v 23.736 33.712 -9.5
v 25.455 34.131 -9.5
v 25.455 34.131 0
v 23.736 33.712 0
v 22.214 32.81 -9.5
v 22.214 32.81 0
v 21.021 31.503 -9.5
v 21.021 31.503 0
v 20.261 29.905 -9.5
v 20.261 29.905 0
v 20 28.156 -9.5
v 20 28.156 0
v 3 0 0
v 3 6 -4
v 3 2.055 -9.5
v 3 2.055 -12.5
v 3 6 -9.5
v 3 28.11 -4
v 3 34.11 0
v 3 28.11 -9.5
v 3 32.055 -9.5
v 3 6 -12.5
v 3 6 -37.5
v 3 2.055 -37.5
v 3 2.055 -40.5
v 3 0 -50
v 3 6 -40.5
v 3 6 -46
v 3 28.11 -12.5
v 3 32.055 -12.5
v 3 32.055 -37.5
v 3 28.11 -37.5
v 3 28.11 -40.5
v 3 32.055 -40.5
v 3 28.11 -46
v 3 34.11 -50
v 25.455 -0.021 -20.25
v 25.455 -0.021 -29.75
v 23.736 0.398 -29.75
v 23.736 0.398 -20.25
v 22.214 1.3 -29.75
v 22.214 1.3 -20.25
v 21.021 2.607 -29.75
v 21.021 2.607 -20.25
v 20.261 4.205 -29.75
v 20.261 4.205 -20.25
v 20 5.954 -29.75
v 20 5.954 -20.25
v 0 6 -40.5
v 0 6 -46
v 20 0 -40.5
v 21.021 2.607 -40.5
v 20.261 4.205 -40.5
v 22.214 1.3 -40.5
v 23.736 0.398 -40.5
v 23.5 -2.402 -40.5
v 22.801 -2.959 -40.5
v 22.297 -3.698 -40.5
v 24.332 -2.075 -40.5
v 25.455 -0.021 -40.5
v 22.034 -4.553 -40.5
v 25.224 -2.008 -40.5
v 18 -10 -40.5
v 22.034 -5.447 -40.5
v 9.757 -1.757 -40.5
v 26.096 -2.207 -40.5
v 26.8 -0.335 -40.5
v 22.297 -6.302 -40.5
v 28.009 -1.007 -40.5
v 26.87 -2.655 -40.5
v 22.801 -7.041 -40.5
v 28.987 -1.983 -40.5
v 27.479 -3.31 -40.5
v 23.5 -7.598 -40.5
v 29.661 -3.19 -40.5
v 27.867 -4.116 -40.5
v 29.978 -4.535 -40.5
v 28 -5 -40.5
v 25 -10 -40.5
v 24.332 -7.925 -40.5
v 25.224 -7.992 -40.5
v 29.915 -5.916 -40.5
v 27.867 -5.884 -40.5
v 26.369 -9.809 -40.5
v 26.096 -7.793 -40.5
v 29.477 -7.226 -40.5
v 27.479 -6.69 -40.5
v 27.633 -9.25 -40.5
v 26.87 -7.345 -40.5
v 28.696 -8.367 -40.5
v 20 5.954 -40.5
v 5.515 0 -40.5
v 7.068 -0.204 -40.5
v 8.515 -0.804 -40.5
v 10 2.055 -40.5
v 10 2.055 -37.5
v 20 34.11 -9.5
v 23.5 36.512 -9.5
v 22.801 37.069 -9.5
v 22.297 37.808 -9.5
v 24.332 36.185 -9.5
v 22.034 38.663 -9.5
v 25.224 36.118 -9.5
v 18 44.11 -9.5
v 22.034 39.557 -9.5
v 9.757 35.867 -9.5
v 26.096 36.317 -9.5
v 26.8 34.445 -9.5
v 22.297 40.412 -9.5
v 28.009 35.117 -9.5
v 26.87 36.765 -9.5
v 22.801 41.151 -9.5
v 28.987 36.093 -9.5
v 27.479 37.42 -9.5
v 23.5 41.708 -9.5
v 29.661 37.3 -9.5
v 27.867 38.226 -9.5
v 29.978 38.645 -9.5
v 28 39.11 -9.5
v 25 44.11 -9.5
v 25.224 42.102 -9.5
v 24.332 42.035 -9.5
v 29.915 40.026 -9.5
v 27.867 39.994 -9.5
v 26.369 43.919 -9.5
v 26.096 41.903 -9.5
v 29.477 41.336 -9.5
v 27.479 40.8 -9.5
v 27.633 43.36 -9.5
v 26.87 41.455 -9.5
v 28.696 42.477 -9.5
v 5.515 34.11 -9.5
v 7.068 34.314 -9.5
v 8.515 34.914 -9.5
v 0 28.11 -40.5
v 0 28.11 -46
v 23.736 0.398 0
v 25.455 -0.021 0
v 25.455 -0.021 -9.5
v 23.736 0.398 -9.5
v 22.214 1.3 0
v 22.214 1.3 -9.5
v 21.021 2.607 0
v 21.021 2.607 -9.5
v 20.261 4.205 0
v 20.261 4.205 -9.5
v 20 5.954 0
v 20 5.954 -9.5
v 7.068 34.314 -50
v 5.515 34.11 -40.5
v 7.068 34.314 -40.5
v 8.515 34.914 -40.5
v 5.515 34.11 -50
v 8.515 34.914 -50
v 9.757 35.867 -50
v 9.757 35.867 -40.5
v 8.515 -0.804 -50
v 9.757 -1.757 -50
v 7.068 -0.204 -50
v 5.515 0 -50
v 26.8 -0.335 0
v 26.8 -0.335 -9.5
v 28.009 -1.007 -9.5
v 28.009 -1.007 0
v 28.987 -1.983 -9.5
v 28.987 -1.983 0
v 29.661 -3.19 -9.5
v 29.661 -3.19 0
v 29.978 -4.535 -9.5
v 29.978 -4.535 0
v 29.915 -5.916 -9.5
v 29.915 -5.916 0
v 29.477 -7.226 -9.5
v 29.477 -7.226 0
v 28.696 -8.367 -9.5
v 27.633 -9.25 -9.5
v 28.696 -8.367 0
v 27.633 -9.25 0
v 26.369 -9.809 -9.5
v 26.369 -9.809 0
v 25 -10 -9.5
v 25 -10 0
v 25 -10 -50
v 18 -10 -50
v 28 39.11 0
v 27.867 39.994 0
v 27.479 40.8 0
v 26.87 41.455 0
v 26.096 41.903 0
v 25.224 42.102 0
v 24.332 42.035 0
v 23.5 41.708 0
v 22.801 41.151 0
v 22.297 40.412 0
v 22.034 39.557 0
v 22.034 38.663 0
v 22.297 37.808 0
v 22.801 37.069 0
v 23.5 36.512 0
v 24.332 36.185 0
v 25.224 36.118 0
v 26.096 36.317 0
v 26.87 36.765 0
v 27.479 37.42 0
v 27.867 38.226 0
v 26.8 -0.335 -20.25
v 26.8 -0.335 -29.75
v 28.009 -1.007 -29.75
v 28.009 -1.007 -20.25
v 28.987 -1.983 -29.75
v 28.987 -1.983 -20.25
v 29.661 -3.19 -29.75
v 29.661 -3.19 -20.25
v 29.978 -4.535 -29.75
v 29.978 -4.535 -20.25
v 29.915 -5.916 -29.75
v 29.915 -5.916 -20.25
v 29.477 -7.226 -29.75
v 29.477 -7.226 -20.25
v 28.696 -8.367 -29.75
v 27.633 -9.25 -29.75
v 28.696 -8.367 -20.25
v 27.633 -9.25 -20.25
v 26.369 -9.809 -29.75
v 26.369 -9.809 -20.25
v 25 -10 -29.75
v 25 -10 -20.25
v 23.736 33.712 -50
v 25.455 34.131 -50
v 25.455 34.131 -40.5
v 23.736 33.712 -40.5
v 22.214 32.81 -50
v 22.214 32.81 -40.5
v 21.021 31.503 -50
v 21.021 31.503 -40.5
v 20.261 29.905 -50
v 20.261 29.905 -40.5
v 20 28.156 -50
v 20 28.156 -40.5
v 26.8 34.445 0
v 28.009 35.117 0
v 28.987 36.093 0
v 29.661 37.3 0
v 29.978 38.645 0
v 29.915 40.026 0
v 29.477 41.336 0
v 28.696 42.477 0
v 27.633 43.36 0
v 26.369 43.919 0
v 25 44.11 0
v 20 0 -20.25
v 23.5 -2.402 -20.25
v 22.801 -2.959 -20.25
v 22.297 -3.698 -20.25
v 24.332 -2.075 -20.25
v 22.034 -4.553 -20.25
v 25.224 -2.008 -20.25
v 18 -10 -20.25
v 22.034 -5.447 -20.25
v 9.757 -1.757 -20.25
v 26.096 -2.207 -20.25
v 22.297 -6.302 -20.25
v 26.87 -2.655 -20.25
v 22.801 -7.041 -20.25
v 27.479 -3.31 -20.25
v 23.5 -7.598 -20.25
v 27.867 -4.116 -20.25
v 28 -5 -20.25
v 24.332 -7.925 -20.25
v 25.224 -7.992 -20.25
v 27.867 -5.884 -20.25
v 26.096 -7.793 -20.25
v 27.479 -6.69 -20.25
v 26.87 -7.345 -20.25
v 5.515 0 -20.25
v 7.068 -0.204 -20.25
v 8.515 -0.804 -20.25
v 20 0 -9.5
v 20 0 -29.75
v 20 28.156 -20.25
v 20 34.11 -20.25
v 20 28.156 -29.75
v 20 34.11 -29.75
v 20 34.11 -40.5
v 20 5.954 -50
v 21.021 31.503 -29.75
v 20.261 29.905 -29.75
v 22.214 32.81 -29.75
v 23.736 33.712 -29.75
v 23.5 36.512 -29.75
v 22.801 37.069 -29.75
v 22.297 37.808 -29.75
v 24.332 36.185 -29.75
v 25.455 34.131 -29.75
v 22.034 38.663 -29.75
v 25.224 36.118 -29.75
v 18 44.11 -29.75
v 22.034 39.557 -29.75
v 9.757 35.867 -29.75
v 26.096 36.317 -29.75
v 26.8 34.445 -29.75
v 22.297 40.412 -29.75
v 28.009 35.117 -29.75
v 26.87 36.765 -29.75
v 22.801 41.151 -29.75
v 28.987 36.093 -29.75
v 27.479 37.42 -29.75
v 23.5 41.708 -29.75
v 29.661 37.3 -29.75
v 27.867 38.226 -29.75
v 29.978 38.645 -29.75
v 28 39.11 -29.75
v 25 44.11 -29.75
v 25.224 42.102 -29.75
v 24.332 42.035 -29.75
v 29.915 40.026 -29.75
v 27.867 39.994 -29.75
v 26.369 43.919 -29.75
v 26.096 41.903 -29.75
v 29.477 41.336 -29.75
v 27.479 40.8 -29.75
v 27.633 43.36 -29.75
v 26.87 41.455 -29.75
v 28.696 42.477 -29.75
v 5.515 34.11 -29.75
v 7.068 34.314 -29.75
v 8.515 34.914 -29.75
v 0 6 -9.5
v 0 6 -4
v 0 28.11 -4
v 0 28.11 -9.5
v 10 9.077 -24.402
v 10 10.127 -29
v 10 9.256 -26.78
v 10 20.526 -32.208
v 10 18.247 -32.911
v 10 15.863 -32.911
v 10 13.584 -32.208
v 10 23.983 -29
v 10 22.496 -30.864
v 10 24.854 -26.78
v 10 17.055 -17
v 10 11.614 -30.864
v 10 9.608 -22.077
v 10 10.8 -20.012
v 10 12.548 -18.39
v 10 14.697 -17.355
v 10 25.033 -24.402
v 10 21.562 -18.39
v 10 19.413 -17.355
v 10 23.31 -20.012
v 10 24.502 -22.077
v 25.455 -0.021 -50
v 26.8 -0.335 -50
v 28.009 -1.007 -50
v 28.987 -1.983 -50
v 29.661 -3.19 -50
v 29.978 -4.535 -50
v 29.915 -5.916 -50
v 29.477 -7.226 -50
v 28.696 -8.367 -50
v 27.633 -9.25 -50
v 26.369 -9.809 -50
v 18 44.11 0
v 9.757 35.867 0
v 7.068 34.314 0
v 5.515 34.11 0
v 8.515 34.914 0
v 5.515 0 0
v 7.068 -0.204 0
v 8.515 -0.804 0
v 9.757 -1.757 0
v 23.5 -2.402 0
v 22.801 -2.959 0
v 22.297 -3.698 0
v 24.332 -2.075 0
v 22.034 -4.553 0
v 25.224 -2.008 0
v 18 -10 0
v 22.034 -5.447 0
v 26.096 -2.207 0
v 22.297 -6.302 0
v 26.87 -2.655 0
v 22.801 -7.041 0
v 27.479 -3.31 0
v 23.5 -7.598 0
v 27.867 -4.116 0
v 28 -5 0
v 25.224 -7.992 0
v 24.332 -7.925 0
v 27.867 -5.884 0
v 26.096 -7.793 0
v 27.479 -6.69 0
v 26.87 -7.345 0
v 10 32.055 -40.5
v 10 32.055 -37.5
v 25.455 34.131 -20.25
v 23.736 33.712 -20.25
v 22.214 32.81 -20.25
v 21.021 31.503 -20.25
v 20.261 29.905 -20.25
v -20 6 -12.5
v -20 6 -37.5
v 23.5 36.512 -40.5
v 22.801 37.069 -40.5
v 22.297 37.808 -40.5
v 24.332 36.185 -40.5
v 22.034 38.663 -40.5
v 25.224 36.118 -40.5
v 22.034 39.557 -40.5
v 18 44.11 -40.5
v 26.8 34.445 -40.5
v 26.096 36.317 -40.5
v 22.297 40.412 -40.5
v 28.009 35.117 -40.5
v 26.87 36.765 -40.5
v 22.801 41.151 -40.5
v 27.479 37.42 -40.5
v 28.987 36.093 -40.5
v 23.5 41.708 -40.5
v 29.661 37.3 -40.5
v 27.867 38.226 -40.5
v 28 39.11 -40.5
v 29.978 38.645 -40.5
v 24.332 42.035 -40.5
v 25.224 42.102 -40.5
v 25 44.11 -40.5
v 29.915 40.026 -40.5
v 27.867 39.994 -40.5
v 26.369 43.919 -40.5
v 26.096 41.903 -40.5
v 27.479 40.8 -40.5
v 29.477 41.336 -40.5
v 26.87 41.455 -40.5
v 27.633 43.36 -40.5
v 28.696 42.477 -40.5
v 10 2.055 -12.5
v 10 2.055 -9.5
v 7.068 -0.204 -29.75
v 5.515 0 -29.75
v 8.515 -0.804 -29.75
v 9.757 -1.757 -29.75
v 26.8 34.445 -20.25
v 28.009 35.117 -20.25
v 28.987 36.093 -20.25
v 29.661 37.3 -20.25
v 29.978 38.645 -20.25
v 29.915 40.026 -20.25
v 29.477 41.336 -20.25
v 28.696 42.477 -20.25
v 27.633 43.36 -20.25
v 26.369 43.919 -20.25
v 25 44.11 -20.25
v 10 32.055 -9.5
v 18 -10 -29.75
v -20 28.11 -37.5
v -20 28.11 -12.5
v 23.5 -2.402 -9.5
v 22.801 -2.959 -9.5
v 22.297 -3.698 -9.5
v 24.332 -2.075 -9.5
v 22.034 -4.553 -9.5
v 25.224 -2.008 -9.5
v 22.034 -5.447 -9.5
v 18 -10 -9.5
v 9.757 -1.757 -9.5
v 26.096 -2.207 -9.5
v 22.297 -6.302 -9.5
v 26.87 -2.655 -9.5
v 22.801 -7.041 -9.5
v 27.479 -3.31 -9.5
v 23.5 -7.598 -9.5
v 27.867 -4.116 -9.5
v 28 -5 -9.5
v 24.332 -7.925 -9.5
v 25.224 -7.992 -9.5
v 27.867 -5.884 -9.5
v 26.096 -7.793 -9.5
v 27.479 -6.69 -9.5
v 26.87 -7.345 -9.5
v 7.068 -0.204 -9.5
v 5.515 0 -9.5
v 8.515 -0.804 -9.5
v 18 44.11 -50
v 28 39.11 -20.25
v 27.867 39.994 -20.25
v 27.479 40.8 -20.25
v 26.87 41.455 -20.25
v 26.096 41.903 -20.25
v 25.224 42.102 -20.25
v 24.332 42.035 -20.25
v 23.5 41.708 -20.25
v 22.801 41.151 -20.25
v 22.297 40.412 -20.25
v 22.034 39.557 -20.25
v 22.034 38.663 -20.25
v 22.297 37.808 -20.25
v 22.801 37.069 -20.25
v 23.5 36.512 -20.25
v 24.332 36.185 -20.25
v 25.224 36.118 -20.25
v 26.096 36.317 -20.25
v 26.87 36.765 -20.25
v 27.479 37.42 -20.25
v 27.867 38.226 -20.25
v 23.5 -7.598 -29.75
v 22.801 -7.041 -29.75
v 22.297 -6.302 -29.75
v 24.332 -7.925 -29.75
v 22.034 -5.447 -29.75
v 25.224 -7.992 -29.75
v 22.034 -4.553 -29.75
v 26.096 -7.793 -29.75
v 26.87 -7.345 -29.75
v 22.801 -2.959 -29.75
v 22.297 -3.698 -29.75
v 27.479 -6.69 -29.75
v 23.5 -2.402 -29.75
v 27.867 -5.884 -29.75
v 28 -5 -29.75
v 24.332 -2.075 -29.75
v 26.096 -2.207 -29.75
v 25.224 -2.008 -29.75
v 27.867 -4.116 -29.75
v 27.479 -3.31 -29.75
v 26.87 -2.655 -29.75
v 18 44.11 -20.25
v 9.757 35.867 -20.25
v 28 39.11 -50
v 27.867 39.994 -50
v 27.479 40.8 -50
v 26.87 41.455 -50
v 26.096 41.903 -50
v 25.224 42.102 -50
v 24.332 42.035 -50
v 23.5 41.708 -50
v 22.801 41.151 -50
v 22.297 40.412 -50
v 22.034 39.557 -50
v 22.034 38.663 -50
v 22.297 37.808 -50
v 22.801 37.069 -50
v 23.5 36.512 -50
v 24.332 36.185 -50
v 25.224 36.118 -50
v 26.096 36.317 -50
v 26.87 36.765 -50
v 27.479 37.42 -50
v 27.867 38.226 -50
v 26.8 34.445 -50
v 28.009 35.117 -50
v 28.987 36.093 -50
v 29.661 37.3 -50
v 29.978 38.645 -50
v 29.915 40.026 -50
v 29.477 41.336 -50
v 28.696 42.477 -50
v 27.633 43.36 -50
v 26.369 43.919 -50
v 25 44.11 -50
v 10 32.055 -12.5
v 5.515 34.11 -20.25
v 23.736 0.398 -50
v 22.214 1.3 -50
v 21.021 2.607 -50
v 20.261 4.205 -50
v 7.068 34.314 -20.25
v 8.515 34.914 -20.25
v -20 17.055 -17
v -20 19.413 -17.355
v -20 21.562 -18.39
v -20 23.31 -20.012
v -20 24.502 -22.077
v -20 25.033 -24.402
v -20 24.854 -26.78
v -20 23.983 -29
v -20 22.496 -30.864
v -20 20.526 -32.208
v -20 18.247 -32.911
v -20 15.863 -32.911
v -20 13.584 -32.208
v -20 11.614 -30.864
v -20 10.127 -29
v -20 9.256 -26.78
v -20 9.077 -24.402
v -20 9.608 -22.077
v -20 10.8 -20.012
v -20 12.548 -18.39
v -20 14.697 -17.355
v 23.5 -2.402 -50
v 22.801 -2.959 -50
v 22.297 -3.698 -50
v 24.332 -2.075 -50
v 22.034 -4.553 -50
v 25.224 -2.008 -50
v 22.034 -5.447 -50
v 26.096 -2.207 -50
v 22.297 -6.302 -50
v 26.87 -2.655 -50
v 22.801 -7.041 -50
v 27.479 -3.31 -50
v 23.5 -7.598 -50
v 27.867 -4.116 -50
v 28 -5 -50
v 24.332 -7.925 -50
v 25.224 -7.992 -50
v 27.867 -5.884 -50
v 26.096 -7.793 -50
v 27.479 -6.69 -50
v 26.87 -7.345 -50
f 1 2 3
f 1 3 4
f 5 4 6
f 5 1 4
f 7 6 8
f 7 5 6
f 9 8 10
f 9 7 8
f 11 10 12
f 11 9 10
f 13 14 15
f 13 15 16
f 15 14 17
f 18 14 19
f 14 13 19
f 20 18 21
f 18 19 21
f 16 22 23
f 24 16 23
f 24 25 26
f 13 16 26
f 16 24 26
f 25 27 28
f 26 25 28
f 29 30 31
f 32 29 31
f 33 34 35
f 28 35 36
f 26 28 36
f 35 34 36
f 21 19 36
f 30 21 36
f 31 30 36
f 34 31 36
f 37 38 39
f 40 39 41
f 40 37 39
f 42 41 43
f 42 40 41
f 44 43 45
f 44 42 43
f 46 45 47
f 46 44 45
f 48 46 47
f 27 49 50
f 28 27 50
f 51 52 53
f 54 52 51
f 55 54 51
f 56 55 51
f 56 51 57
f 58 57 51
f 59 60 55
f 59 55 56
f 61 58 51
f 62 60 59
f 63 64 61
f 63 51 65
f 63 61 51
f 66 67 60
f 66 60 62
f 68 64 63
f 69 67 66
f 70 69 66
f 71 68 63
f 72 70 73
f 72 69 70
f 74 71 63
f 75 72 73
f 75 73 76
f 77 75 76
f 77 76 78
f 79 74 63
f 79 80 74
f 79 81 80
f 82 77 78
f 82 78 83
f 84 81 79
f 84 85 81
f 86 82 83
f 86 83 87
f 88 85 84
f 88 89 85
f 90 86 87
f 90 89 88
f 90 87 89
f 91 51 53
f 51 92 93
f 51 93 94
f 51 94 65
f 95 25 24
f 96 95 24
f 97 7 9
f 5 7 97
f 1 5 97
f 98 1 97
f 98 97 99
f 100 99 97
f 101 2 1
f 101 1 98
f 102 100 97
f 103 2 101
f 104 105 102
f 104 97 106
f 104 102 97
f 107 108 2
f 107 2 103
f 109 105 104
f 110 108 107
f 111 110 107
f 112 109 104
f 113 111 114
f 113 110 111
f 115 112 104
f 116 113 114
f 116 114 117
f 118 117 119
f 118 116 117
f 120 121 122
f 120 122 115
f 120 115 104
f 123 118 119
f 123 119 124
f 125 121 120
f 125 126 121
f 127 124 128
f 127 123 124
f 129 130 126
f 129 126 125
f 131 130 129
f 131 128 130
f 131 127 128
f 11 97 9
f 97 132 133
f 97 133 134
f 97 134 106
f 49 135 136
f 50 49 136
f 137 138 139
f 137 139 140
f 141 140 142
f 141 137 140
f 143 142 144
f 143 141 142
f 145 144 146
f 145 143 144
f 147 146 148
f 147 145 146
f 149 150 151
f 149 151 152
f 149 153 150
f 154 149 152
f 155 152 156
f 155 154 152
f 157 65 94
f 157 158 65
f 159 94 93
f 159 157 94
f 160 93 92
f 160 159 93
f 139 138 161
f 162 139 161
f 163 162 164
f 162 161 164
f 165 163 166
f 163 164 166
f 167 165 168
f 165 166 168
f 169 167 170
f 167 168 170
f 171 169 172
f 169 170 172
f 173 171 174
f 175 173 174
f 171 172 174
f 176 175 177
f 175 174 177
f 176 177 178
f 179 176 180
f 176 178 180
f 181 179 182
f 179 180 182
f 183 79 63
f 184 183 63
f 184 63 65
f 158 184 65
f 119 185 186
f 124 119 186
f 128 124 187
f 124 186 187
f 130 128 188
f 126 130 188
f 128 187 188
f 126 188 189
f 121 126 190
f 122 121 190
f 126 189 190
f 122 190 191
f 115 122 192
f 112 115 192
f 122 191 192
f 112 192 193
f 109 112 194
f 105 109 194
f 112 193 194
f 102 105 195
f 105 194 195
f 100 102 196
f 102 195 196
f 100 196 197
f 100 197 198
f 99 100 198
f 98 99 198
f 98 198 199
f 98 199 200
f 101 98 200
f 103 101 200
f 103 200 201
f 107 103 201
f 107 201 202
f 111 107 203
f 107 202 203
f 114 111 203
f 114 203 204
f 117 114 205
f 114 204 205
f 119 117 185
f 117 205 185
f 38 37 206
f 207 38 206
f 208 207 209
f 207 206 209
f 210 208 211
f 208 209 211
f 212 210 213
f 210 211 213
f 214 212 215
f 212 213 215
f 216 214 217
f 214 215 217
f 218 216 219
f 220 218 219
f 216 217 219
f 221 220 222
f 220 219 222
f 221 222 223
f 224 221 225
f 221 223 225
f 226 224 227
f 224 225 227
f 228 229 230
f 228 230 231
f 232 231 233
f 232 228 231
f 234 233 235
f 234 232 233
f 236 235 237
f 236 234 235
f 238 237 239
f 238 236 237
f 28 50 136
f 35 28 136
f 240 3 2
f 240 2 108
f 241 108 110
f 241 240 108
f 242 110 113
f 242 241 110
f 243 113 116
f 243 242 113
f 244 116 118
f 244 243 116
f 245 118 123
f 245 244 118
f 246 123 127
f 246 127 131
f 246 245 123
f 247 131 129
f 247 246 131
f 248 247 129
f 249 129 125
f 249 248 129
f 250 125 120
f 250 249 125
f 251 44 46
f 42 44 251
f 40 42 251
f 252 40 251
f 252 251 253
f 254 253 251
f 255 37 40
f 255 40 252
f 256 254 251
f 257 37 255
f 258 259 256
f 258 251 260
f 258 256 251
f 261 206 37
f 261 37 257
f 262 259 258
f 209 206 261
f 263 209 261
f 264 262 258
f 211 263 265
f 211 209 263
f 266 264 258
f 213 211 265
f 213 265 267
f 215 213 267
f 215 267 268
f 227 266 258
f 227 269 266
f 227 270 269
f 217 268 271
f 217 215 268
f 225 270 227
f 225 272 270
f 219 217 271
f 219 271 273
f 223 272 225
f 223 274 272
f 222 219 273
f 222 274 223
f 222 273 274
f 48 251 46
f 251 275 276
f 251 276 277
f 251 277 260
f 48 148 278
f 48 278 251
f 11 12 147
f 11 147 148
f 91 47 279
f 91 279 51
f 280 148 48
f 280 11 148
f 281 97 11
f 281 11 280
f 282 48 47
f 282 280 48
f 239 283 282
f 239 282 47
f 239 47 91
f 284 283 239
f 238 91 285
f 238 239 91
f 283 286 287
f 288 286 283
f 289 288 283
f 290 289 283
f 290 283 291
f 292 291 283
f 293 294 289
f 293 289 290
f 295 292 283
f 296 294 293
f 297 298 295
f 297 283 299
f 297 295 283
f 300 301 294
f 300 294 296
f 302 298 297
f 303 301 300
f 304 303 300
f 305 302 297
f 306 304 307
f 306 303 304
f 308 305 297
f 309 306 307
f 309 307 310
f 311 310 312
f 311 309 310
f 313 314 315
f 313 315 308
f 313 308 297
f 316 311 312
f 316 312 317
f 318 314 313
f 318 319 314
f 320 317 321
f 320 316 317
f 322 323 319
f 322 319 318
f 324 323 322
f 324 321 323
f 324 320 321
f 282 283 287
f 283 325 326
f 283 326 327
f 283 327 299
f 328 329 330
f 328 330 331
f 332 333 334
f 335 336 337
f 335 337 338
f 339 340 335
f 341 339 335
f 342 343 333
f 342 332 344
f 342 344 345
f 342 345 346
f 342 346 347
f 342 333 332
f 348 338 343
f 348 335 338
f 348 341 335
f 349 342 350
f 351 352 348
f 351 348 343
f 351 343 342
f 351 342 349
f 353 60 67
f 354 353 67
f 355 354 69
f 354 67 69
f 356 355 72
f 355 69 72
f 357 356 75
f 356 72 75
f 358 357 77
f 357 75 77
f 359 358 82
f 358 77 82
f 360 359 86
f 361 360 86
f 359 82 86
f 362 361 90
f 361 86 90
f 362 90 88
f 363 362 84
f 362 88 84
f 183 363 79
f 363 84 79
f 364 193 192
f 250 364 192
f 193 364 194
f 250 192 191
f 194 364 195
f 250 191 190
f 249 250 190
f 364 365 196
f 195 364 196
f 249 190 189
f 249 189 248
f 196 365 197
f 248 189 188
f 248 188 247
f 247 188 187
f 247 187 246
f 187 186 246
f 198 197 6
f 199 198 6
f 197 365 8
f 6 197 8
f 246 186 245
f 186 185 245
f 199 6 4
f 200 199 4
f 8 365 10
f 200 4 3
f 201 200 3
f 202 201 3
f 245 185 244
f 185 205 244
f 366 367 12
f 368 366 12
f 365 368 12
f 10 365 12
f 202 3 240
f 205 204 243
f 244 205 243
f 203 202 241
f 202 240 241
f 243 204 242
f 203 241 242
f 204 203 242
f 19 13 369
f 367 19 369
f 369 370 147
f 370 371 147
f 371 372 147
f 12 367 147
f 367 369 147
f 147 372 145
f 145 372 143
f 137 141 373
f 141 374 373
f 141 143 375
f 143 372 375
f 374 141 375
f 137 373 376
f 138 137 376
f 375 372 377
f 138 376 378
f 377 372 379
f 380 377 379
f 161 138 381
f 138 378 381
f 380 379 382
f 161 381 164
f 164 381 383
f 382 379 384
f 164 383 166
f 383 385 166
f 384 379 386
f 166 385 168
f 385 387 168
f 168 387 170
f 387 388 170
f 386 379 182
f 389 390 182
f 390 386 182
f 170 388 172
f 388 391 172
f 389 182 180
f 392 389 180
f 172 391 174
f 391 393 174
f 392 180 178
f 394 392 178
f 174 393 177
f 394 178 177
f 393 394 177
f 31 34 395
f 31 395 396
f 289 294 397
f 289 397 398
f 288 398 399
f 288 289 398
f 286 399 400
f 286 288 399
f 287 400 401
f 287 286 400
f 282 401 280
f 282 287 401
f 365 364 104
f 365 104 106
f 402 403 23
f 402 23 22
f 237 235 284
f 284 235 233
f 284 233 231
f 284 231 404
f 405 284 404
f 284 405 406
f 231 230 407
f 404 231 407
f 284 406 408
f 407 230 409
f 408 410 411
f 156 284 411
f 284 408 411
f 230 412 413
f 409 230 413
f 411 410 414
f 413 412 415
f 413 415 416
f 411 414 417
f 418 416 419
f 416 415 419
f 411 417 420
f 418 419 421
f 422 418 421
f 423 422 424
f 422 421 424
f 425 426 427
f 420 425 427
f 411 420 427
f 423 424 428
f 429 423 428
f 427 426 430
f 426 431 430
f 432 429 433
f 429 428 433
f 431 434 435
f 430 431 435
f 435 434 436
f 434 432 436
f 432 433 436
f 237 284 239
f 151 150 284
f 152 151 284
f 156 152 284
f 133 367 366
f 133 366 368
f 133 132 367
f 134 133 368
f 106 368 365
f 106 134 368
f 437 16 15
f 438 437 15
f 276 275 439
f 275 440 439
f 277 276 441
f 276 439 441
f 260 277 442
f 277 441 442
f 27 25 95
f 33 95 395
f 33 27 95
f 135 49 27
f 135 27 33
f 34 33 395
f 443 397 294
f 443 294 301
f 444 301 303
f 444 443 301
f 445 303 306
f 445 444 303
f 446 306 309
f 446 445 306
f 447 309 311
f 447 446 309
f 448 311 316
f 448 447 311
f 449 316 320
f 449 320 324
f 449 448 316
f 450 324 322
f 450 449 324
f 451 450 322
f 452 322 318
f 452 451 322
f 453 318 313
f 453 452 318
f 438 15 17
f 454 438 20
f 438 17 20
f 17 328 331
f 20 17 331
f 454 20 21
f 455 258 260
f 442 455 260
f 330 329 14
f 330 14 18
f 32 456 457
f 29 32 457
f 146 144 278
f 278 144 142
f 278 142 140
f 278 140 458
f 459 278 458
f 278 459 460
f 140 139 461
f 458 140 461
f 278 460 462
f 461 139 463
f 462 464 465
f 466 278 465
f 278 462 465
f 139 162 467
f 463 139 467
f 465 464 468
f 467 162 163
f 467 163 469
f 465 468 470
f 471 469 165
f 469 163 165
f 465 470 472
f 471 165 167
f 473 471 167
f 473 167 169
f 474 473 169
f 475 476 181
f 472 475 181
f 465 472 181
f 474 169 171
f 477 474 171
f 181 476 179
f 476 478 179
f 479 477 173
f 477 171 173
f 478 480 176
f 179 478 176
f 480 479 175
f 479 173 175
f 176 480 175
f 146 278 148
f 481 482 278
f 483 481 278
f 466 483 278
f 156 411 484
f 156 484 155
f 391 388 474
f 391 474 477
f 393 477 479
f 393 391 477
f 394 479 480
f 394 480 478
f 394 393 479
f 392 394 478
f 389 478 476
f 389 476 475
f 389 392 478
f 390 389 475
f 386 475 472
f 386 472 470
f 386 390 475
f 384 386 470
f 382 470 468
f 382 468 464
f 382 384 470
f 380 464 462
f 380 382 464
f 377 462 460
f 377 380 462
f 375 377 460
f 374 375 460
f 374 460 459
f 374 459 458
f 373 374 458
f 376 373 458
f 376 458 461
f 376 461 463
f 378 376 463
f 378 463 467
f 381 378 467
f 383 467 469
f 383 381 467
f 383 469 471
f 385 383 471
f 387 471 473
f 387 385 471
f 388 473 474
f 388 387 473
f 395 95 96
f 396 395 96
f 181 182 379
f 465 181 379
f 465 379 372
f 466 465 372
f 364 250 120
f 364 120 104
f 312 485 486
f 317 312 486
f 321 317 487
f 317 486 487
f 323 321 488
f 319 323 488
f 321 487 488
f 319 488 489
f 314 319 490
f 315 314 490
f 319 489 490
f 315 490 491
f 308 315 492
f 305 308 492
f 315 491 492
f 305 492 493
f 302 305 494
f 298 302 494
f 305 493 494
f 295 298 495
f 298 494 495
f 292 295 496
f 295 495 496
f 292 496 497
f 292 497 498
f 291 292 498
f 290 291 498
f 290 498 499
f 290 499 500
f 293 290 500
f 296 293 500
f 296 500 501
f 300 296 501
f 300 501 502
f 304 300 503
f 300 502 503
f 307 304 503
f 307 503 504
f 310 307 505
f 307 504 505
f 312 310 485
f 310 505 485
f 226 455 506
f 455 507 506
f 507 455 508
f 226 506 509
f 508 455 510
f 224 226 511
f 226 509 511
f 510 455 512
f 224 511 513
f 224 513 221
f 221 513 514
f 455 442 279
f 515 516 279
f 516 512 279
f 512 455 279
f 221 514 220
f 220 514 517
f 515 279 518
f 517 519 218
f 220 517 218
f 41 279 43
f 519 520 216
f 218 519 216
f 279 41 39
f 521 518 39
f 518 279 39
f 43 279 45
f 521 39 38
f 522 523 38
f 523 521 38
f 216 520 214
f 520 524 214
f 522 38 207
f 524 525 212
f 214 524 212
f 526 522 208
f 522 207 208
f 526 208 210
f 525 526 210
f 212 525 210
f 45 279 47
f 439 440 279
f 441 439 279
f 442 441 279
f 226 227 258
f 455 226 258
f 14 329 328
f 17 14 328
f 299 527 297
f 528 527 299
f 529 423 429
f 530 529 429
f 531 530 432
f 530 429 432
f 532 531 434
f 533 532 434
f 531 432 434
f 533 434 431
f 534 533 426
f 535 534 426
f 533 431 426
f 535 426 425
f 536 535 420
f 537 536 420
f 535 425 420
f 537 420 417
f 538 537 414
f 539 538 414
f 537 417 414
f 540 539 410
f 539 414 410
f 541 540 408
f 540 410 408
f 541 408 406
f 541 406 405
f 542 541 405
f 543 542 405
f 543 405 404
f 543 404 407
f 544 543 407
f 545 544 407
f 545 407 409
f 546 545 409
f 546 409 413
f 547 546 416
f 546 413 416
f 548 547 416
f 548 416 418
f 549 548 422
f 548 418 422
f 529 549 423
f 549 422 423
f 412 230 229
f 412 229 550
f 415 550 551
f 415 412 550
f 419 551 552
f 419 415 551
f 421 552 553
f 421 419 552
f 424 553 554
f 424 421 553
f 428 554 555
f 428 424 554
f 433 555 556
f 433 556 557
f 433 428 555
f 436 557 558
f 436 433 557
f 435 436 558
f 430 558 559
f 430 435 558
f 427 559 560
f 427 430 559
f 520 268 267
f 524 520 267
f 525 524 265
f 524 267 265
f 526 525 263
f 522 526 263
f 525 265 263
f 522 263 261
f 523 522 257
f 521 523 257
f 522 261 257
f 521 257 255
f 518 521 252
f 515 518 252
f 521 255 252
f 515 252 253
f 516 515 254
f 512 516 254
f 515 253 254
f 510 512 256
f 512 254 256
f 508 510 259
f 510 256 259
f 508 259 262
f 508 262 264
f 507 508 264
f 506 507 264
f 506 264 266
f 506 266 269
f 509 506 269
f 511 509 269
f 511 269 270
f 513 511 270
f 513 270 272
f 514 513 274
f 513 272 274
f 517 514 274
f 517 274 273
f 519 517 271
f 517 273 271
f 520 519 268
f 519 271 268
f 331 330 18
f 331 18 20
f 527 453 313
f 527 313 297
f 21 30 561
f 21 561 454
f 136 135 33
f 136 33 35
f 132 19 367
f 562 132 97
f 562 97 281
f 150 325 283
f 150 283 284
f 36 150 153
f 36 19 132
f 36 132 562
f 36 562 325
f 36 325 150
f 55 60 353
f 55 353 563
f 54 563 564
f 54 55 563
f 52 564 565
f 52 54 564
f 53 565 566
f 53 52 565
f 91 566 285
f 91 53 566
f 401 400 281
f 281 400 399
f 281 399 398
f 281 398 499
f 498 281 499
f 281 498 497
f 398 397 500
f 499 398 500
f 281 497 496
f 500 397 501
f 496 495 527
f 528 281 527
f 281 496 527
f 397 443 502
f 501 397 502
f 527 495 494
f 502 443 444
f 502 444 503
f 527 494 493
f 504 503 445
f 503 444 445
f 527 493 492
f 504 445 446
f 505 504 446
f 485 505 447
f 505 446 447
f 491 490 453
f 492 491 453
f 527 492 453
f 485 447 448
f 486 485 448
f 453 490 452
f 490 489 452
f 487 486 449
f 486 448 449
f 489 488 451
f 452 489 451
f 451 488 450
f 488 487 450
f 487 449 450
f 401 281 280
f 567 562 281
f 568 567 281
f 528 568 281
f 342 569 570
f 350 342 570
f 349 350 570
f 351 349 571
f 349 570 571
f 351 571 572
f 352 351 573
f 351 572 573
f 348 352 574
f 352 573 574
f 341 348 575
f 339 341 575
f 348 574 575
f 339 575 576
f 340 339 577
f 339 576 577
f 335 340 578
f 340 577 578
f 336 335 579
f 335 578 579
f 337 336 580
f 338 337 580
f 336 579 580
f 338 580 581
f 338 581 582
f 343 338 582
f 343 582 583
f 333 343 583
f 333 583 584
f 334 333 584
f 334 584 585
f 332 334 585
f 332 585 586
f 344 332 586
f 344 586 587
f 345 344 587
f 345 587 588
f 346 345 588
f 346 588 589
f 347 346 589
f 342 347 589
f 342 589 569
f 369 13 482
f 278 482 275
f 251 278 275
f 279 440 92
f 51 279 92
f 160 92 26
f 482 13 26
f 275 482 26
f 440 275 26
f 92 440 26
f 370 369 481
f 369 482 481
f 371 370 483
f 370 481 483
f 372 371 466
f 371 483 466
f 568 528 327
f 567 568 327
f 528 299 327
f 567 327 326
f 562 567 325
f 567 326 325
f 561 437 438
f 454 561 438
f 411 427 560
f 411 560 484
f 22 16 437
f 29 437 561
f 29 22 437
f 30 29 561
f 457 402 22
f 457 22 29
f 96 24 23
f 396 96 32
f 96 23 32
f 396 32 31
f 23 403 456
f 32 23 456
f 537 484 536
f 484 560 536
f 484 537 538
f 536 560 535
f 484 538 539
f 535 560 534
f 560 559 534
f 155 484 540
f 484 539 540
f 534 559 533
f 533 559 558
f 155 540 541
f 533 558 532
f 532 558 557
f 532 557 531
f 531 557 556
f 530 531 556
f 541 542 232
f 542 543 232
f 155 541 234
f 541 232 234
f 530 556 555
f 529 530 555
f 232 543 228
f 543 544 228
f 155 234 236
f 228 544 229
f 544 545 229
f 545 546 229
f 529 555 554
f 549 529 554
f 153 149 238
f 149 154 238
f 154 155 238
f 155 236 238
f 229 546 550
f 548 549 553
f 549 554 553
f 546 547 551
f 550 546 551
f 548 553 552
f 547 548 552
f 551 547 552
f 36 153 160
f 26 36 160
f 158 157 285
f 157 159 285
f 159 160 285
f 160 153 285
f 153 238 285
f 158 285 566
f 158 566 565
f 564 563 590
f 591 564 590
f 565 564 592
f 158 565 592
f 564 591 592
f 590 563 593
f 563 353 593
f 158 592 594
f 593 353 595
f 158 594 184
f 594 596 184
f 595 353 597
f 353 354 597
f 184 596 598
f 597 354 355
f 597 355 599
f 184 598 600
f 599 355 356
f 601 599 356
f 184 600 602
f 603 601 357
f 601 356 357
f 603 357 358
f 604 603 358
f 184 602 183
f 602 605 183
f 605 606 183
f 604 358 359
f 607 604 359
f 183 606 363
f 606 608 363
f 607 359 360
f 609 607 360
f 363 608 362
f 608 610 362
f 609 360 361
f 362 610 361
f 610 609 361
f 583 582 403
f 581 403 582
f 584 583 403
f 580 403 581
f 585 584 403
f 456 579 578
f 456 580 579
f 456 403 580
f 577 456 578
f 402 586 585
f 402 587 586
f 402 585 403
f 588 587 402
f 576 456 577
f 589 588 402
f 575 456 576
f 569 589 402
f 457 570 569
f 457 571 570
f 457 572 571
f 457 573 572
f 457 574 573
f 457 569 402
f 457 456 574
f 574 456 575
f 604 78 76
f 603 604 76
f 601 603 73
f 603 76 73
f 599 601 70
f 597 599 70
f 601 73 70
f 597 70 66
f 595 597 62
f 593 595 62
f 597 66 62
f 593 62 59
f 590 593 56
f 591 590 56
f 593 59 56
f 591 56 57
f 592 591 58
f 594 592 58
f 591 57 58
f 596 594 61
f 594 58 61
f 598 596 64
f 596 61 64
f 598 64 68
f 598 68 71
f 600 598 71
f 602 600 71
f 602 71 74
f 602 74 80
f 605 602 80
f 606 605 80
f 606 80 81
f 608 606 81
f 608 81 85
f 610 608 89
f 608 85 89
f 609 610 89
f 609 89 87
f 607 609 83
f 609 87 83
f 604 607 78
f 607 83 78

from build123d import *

# Parameters (mm, degrees)
SKETCH1_W               = 50
SKETCH1_H               = 34.11
BOSS_EXTRUDE1_DEPTH     = 20
SKETCH2_R               = 3
BOSS_EXTRUDE2_DEPTH     = 9.5
LPATTERN1_COUNT         = 3
LPATTERN1_PITCH         = 20.25
MIRROR1_COPY_1_SKETCH_R = 3
MIRROR1_COPY_1_DEPTH    = 9.5
MIRROR1_COPY_2_SKETCH_R = 3
MIRROR1_COPY_2_DEPTH    = 9.5
SKETCH3_R               = 8
SKETCH3_W               = 3
SKETCH3_H               = 30
CUT_EXTRUDE1_DEPTH      = 10
SKETCH4_W               = 42
SKETCH4_H               = 22.11
CUT_EXTRUDE2_DEPTH      = 3
FILLET1_R               = 6
FILLET2_R               = 6
BOSS_EXTRUDE3_START     = 20
SKETCH5_W               = 25
SKETCH5_H               = 22.11
SKETCH5_R               = 8
BOSS_EXTRUDE3_DEPTH     = 20


with BuildPart() as part:
    # Sketch1 → Boss-Extrude1 (new body)
    with BuildSketch(Plane(origin=(0, 0, 0), x_dir=(0, 0, -1), z_dir=(1, 0, 0))):
        with Locations((25, 17.055)):
            Rectangle(SKETCH1_W, SKETCH1_H)
    extrude(amount=BOSS_EXTRUDE1_DEPTH)

    # Sketch2 → Boss-Extrude2 (add)
    with BuildSketch(Plane.XY):
        with BuildLine():
            Line((20, 34.11), (25, 34.11))
            ThreePointArc((25, 34.11), (30, 39.11), (25, 44.11))
            Line((25, 44.11), (18, 44.11))
            Line((18, 44.11), (8, 34.11))
            Line((8, 34.11), (20, 34.11))
        make_face()
        with Locations((25, 39.11)):
            Circle(SKETCH2_R, mode=Mode.SUBTRACT)
    boss_extrude2 = extrude(amount=-BOSS_EXTRUDE2_DEPTH)

    # LPattern1: Boss-Extrude2 ×3
    with Locations(*[(0, 0, -i * LPATTERN1_PITCH) for i in range(1, LPATTERN1_COUNT)]):
        add(boss_extrude2)

    # Mirror1: Boss-Extrude2 across plane
    add(boss_extrude2.mirror(Plane.ZX.offset(17.055)))

    # Mirror1 copy 1 sketch → Mirror1 copy 1 (add)
    with BuildSketch(Plane(origin=(0, 34.11, -20.25), x_dir=(1, 0, 0), z_dir=(0, 0, 1))):
        with BuildLine():
            Line((20, -34.11), (25, -34.11))
            ThreePointArc((25, -34.11), (30, -39.11), (25, -44.11))
            Line((25, -44.11), (18, -44.11))
            Line((18, -44.11), (8, -34.11))
            Line((8, -34.11), (20, -34.11))
        make_face()
        with Locations((25, -39.11)):
            Circle(MIRROR1_COPY_1_SKETCH_R, mode=Mode.SUBTRACT)
    extrude(amount=-MIRROR1_COPY_1_DEPTH)

    # Mirror1 copy 2 sketch → Mirror1 copy 2 (add)
    with BuildSketch(Plane(origin=(0, 34.11, -40.5), x_dir=(1, 0, 0), z_dir=(0, 0, 1))):
        with BuildLine():
            Line((20, -34.11), (25, -34.11))
            ThreePointArc((25, -34.11), (30, -39.11), (25, -44.11))
            Line((25, -44.11), (18, -44.11))
            Line((18, -44.11), (8, -34.11))
            Line((8, -34.11), (20, -34.11))
        make_face()
        with Locations((25, -39.11)):
            Circle(MIRROR1_COPY_2_SKETCH_R, mode=Mode.SUBTRACT)
    extrude(amount=-MIRROR1_COPY_2_DEPTH)

    # Sketch3 → Cut-Extrude1 (cut)
    with BuildSketch(Plane.ZY):
        with Locations((-25, 17.055)):
            Circle(SKETCH3_R)
        with Locations((-39, 17.055)):
            Rectangle(SKETCH3_W, SKETCH3_H)
        with Locations((-11, 17.055)):
            Rectangle(SKETCH3_W, SKETCH3_H)
    extrude(amount=-CUT_EXTRUDE1_DEPTH, mode=Mode.SUBTRACT)

    # Sketch4 → Cut-Extrude2 (cut)
    with BuildSketch(Plane(origin=(0, 0, 0), x_dir=(0, 0, -1), z_dir=(1, 0, 0))):
        Polygon((50, 34.11), (0, 34.11), (0, 28.11), (0, 6), (0, 0), (50, 0), (50, 6), (50, 28.11), align=None)
        with Locations((25, 17.055)):
            Rectangle(SKETCH4_W, SKETCH4_H, mode=Mode.SUBTRACT)
    extrude(amount=CUT_EXTRUDE2_DEPTH, mode=Mode.SUBTRACT)

    # Fillet1
    # the kernel refuses this fillet: 6 mm, written as the material it adds along each edge
    with BuildSketch(Plane(origin=(20, 0, -25.613872125), x_dir=(0, 1, 0), z_dir=(0, 0, -1))) as fillet1_piece_1_section:
        with BuildLine():
            CenterArc((5.95445115, 6), FILLET1_R, 185.21590857, 84.78409143)
            Line((-0.020704023, 5.454545455), (-0.61821954, 5.4))
            ThreePointArc((-0.61821954, 5.4), (-0.6, 5), (-0.6, 0))
            Line((-0.6, 0), (0, -0.6))
            Line((0, -0.6), (5.95445115, -0.6))
            Line((5.95445115, -0.6), (5.95445115, 0))
        make_face()
    fillet1_piece_1 = extrude(amount=39.272255751, mode=Mode.PRIVATE)
    fillet1_piece_1 = split(fillet1_piece_1, bisect_by=Plane(origin=(21.495039794, 1.973310918, -29.75), z_dir=(0, 0, 1)), keep=Keep.TOP, mode=Mode.PRIVATE)
    add(fillet1_piece_1)
    with BuildSketch(Plane(origin=(20, 0, -40.5), x_dir=(0, 1, 0), z_dir=(0, 0, -1)), Plane(origin=(20, 0, -20.25), x_dir=(0, 1, 0), z_dir=(0, 0, -1)), Plane(origin=(20, 0, 0), x_dir=(0, 1, 0), z_dir=(0, 0, -1)), Plane(origin=(20, 34.11, -50), x_dir=(0, -1, 0), z_dir=(0, 0, 1)), Plane(origin=(20, 34.11, -29.75), x_dir=(0, -1, 0), z_dir=(0, 0, 1)), Plane(origin=(20, 34.11, -9.5), x_dir=(0, -1, 0), z_dir=(0, 0, 1))) as fillet1_piece_2:
        with BuildLine():
            CenterArc((5.95445115, 6), FILLET1_R, 185.21590857, 84.78409143)
            Line((-0.020704023, 5.454545455), (-0.61821954, 5.4))
            ThreePointArc((-0.61821954, 5.4), (-0.6, 5), (-0.6, 0))
            Line((-0.6, 0), (0, -0.6))
            Line((0, -0.6), (5.95445115, -0.6))
            Line((5.95445115, -0.6), (5.95445115, 0))
        make_face()
    extrude(amount=9.5)
    with BuildSketch(Plane(origin=(20, 0, -5.363872125), x_dir=(0, 1, 0), z_dir=(0, 0, -1))) as fillet1_piece_3_section:
        with BuildLine():
            CenterArc((5.95445115, 6), FILLET1_R, 185.21590857, 84.78409143)
            Line((-0.020704023, 5.454545455), (-0.61821954, 5.4))
            ThreePointArc((-0.61821954, 5.4), (-0.6, 5), (-0.6, 0))
            Line((-0.6, 0), (0, -0.6))
            Line((0, -0.6), (5.95445115, -0.6))
            Line((5.95445115, -0.6), (5.95445115, 0))
        make_face()
    fillet1_piece_3 = extrude(amount=39.272255751, mode=Mode.PRIVATE)
    fillet1_piece_3 = split(fillet1_piece_3, bisect_by=Plane(origin=(21.495039794, 1.973310918, -9.5), z_dir=(0, 0, 1)), keep=Keep.TOP, mode=Mode.PRIVATE)
    add(fillet1_piece_3)
    with BuildSketch(Plane(origin=(20, 0, -5.363872125), x_dir=(0, 1, 0), z_dir=(0, 0, -1))) as fillet1_piece_4_section:
        with BuildLine():
            CenterArc((5.95445115, 6), FILLET1_R, 185.21590857, 84.78409143)
            Line((-0.020704023, 5.454545455), (-0.61821954, 5.4))
            ThreePointArc((-0.61821954, 5.4), (-0.6, 5), (-0.6, 0))
            Line((-0.6, 0), (0, -0.6))
            Line((0, -0.6), (5.95445115, -0.6))
            Line((5.95445115, -0.6), (5.95445115, 0))
        make_face()
    fillet1_piece_4 = extrude(amount=39.272255751, mode=Mode.PRIVATE)
    fillet1_piece_4 = split(fillet1_piece_4, bisect_by=Plane(origin=(21.495039794, 1.973310918, -40.5), z_dir=(0, 0, -1)), keep=Keep.TOP, mode=Mode.PRIVATE)
    add(fillet1_piece_4)
    with BuildSketch(Plane(origin=(20, 0, 14.886127875), x_dir=(0, 1, 0), z_dir=(0, 0, -1))) as fillet1_piece_5_section:
        with BuildLine():
            CenterArc((5.95445115, 6), FILLET1_R, 185.21590857, 84.78409143)
            Line((-0.020704023, 5.454545455), (-0.61821954, 5.4))
            ThreePointArc((-0.61821954, 5.4), (-0.6, 5), (-0.6, 0))
            Line((-0.6, 0), (0, -0.6))
            Line((0, -0.6), (5.95445115, -0.6))
            Line((5.95445115, -0.6), (5.95445115, 0))
        make_face()
    fillet1_piece_5 = extrude(amount=39.272255751, mode=Mode.PRIVATE)
    fillet1_piece_5 = split(fillet1_piece_5, bisect_by=Plane(origin=(21.495039794, 1.973310918, -20.25), z_dir=(0, 0, -1)), keep=Keep.TOP, mode=Mode.PRIVATE)
    add(fillet1_piece_5)
    with BuildSketch(Plane(origin=(20, 34.11, -64.886127875), x_dir=(0, -1, 0), z_dir=(0, 0, 1))) as fillet1_piece_6_section:
        with BuildLine():
            CenterArc((5.95445115, 6), FILLET1_R, 185.21590857, 84.78409143)
            Line((-0.020704023, 5.454545455), (-0.61821954, 5.4))
            ThreePointArc((-0.61821954, 5.4), (-0.6, 5), (-0.6, 0))
            Line((-0.6, 0), (0, -0.6))
            Line((0, -0.6), (5.95445115, -0.6))
            Line((5.95445115, -0.6), (5.95445115, 0))
        make_face()
    fillet1_piece_6 = extrude(amount=39.272255751, mode=Mode.PRIVATE)
    fillet1_piece_6 = split(fillet1_piece_6, bisect_by=Plane(origin=(21.495039794, 32.136689082, -29.75), z_dir=(0, 0, 1)), keep=Keep.TOP, mode=Mode.PRIVATE)
    add(fillet1_piece_6)
    with BuildSketch(Plane(origin=(20, 34.11, -44.636127875), x_dir=(0, -1, 0), z_dir=(0, 0, 1))) as fillet1_piece_7_section:
        with BuildLine():
            CenterArc((5.95445115, 6), FILLET1_R, 185.21590857, 84.78409143)
            Line((-0.020704023, 5.454545455), (-0.61821954, 5.4))
            ThreePointArc((-0.61821954, 5.4), (-0.6, 5), (-0.6, 0))
            Line((-0.6, 0), (0, -0.6))
            Line((0, -0.6), (5.95445115, -0.6))
            Line((5.95445115, -0.6), (5.95445115, 0))
        make_face()
    fillet1_piece_7 = extrude(amount=39.272255751, mode=Mode.PRIVATE)
    fillet1_piece_7 = split(fillet1_piece_7, bisect_by=Plane(origin=(21.495039794, 32.136689082, -40.5), z_dir=(0, 0, -1)), keep=Keep.TOP, mode=Mode.PRIVATE)
    add(fillet1_piece_7)
    with BuildSketch(Plane(origin=(20, 34.11, -44.636127875), x_dir=(0, -1, 0), z_dir=(0, 0, 1))) as fillet1_piece_8_section:
        with BuildLine():
            CenterArc((5.95445115, 6), FILLET1_R, 185.21590857, 84.78409143)
            Line((-0.020704023, 5.454545455), (-0.61821954, 5.4))
            ThreePointArc((-0.61821954, 5.4), (-0.6, 5), (-0.6, 0))
            Line((-0.6, 0), (0, -0.6))
            Line((0, -0.6), (5.95445115, -0.6))
            Line((5.95445115, -0.6), (5.95445115, 0))
        make_face()
    fillet1_piece_8 = extrude(amount=39.272255751, mode=Mode.PRIVATE)
    fillet1_piece_8 = split(fillet1_piece_8, bisect_by=Plane(origin=(21.495039794, 32.136689082, -9.5), z_dir=(0, 0, 1)), keep=Keep.TOP, mode=Mode.PRIVATE)
    add(fillet1_piece_8)
    with BuildSketch(Plane(origin=(20, 34.11, -24.386127875), x_dir=(0, -1, 0), z_dir=(0, 0, 1))) as fillet1_piece_9_section:
        with BuildLine():
            CenterArc((5.95445115, 6), FILLET1_R, 185.21590857, 84.78409143)
            Line((-0.020704023, 5.454545455), (-0.61821954, 5.4))
            ThreePointArc((-0.61821954, 5.4), (-0.6, 5), (-0.6, 0))
            Line((-0.6, 0), (0, -0.6))
            Line((0, -0.6), (5.95445115, -0.6))
            Line((5.95445115, -0.6), (5.95445115, 0))
        make_face()
    fillet1_piece_9 = extrude(amount=39.272255751, mode=Mode.PRIVATE)
    fillet1_piece_9 = split(fillet1_piece_9, bisect_by=Plane(origin=(21.495039794, 32.136689082, -20.25), z_dir=(0, 0, -1)), keep=Keep.TOP, mode=Mode.PRIVATE)
    add(fillet1_piece_9)

    # Fillet2
    fillet2_edges = [part.edges().sort_by_distance(p)[0] for p in [
        (8, 0, -45.25),
        (8, 34.11, -4.75),
        (8, 34.11, -25),
        (8, 34.11, -45.25),
        (8, 0, -4.75),
        (8, 0, -25),
    ]]
    fillet(fillet2_edges, radius=FILLET2_R)

    # Sketch5 → Boss-Extrude3 (add)
    with BuildSketch(Plane.ZY.offset(BOSS_EXTRUDE3_START)):
        with Locations((-25, 17.055)):
            Rectangle(SKETCH5_W, SKETCH5_H)
        with Locations((-25, 17.055)):
            Circle(SKETCH5_R, mode=Mode.SUBTRACT)
    extrude(amount=-BOSS_EXTRUDE3_DEPTH)


solid = part.part
